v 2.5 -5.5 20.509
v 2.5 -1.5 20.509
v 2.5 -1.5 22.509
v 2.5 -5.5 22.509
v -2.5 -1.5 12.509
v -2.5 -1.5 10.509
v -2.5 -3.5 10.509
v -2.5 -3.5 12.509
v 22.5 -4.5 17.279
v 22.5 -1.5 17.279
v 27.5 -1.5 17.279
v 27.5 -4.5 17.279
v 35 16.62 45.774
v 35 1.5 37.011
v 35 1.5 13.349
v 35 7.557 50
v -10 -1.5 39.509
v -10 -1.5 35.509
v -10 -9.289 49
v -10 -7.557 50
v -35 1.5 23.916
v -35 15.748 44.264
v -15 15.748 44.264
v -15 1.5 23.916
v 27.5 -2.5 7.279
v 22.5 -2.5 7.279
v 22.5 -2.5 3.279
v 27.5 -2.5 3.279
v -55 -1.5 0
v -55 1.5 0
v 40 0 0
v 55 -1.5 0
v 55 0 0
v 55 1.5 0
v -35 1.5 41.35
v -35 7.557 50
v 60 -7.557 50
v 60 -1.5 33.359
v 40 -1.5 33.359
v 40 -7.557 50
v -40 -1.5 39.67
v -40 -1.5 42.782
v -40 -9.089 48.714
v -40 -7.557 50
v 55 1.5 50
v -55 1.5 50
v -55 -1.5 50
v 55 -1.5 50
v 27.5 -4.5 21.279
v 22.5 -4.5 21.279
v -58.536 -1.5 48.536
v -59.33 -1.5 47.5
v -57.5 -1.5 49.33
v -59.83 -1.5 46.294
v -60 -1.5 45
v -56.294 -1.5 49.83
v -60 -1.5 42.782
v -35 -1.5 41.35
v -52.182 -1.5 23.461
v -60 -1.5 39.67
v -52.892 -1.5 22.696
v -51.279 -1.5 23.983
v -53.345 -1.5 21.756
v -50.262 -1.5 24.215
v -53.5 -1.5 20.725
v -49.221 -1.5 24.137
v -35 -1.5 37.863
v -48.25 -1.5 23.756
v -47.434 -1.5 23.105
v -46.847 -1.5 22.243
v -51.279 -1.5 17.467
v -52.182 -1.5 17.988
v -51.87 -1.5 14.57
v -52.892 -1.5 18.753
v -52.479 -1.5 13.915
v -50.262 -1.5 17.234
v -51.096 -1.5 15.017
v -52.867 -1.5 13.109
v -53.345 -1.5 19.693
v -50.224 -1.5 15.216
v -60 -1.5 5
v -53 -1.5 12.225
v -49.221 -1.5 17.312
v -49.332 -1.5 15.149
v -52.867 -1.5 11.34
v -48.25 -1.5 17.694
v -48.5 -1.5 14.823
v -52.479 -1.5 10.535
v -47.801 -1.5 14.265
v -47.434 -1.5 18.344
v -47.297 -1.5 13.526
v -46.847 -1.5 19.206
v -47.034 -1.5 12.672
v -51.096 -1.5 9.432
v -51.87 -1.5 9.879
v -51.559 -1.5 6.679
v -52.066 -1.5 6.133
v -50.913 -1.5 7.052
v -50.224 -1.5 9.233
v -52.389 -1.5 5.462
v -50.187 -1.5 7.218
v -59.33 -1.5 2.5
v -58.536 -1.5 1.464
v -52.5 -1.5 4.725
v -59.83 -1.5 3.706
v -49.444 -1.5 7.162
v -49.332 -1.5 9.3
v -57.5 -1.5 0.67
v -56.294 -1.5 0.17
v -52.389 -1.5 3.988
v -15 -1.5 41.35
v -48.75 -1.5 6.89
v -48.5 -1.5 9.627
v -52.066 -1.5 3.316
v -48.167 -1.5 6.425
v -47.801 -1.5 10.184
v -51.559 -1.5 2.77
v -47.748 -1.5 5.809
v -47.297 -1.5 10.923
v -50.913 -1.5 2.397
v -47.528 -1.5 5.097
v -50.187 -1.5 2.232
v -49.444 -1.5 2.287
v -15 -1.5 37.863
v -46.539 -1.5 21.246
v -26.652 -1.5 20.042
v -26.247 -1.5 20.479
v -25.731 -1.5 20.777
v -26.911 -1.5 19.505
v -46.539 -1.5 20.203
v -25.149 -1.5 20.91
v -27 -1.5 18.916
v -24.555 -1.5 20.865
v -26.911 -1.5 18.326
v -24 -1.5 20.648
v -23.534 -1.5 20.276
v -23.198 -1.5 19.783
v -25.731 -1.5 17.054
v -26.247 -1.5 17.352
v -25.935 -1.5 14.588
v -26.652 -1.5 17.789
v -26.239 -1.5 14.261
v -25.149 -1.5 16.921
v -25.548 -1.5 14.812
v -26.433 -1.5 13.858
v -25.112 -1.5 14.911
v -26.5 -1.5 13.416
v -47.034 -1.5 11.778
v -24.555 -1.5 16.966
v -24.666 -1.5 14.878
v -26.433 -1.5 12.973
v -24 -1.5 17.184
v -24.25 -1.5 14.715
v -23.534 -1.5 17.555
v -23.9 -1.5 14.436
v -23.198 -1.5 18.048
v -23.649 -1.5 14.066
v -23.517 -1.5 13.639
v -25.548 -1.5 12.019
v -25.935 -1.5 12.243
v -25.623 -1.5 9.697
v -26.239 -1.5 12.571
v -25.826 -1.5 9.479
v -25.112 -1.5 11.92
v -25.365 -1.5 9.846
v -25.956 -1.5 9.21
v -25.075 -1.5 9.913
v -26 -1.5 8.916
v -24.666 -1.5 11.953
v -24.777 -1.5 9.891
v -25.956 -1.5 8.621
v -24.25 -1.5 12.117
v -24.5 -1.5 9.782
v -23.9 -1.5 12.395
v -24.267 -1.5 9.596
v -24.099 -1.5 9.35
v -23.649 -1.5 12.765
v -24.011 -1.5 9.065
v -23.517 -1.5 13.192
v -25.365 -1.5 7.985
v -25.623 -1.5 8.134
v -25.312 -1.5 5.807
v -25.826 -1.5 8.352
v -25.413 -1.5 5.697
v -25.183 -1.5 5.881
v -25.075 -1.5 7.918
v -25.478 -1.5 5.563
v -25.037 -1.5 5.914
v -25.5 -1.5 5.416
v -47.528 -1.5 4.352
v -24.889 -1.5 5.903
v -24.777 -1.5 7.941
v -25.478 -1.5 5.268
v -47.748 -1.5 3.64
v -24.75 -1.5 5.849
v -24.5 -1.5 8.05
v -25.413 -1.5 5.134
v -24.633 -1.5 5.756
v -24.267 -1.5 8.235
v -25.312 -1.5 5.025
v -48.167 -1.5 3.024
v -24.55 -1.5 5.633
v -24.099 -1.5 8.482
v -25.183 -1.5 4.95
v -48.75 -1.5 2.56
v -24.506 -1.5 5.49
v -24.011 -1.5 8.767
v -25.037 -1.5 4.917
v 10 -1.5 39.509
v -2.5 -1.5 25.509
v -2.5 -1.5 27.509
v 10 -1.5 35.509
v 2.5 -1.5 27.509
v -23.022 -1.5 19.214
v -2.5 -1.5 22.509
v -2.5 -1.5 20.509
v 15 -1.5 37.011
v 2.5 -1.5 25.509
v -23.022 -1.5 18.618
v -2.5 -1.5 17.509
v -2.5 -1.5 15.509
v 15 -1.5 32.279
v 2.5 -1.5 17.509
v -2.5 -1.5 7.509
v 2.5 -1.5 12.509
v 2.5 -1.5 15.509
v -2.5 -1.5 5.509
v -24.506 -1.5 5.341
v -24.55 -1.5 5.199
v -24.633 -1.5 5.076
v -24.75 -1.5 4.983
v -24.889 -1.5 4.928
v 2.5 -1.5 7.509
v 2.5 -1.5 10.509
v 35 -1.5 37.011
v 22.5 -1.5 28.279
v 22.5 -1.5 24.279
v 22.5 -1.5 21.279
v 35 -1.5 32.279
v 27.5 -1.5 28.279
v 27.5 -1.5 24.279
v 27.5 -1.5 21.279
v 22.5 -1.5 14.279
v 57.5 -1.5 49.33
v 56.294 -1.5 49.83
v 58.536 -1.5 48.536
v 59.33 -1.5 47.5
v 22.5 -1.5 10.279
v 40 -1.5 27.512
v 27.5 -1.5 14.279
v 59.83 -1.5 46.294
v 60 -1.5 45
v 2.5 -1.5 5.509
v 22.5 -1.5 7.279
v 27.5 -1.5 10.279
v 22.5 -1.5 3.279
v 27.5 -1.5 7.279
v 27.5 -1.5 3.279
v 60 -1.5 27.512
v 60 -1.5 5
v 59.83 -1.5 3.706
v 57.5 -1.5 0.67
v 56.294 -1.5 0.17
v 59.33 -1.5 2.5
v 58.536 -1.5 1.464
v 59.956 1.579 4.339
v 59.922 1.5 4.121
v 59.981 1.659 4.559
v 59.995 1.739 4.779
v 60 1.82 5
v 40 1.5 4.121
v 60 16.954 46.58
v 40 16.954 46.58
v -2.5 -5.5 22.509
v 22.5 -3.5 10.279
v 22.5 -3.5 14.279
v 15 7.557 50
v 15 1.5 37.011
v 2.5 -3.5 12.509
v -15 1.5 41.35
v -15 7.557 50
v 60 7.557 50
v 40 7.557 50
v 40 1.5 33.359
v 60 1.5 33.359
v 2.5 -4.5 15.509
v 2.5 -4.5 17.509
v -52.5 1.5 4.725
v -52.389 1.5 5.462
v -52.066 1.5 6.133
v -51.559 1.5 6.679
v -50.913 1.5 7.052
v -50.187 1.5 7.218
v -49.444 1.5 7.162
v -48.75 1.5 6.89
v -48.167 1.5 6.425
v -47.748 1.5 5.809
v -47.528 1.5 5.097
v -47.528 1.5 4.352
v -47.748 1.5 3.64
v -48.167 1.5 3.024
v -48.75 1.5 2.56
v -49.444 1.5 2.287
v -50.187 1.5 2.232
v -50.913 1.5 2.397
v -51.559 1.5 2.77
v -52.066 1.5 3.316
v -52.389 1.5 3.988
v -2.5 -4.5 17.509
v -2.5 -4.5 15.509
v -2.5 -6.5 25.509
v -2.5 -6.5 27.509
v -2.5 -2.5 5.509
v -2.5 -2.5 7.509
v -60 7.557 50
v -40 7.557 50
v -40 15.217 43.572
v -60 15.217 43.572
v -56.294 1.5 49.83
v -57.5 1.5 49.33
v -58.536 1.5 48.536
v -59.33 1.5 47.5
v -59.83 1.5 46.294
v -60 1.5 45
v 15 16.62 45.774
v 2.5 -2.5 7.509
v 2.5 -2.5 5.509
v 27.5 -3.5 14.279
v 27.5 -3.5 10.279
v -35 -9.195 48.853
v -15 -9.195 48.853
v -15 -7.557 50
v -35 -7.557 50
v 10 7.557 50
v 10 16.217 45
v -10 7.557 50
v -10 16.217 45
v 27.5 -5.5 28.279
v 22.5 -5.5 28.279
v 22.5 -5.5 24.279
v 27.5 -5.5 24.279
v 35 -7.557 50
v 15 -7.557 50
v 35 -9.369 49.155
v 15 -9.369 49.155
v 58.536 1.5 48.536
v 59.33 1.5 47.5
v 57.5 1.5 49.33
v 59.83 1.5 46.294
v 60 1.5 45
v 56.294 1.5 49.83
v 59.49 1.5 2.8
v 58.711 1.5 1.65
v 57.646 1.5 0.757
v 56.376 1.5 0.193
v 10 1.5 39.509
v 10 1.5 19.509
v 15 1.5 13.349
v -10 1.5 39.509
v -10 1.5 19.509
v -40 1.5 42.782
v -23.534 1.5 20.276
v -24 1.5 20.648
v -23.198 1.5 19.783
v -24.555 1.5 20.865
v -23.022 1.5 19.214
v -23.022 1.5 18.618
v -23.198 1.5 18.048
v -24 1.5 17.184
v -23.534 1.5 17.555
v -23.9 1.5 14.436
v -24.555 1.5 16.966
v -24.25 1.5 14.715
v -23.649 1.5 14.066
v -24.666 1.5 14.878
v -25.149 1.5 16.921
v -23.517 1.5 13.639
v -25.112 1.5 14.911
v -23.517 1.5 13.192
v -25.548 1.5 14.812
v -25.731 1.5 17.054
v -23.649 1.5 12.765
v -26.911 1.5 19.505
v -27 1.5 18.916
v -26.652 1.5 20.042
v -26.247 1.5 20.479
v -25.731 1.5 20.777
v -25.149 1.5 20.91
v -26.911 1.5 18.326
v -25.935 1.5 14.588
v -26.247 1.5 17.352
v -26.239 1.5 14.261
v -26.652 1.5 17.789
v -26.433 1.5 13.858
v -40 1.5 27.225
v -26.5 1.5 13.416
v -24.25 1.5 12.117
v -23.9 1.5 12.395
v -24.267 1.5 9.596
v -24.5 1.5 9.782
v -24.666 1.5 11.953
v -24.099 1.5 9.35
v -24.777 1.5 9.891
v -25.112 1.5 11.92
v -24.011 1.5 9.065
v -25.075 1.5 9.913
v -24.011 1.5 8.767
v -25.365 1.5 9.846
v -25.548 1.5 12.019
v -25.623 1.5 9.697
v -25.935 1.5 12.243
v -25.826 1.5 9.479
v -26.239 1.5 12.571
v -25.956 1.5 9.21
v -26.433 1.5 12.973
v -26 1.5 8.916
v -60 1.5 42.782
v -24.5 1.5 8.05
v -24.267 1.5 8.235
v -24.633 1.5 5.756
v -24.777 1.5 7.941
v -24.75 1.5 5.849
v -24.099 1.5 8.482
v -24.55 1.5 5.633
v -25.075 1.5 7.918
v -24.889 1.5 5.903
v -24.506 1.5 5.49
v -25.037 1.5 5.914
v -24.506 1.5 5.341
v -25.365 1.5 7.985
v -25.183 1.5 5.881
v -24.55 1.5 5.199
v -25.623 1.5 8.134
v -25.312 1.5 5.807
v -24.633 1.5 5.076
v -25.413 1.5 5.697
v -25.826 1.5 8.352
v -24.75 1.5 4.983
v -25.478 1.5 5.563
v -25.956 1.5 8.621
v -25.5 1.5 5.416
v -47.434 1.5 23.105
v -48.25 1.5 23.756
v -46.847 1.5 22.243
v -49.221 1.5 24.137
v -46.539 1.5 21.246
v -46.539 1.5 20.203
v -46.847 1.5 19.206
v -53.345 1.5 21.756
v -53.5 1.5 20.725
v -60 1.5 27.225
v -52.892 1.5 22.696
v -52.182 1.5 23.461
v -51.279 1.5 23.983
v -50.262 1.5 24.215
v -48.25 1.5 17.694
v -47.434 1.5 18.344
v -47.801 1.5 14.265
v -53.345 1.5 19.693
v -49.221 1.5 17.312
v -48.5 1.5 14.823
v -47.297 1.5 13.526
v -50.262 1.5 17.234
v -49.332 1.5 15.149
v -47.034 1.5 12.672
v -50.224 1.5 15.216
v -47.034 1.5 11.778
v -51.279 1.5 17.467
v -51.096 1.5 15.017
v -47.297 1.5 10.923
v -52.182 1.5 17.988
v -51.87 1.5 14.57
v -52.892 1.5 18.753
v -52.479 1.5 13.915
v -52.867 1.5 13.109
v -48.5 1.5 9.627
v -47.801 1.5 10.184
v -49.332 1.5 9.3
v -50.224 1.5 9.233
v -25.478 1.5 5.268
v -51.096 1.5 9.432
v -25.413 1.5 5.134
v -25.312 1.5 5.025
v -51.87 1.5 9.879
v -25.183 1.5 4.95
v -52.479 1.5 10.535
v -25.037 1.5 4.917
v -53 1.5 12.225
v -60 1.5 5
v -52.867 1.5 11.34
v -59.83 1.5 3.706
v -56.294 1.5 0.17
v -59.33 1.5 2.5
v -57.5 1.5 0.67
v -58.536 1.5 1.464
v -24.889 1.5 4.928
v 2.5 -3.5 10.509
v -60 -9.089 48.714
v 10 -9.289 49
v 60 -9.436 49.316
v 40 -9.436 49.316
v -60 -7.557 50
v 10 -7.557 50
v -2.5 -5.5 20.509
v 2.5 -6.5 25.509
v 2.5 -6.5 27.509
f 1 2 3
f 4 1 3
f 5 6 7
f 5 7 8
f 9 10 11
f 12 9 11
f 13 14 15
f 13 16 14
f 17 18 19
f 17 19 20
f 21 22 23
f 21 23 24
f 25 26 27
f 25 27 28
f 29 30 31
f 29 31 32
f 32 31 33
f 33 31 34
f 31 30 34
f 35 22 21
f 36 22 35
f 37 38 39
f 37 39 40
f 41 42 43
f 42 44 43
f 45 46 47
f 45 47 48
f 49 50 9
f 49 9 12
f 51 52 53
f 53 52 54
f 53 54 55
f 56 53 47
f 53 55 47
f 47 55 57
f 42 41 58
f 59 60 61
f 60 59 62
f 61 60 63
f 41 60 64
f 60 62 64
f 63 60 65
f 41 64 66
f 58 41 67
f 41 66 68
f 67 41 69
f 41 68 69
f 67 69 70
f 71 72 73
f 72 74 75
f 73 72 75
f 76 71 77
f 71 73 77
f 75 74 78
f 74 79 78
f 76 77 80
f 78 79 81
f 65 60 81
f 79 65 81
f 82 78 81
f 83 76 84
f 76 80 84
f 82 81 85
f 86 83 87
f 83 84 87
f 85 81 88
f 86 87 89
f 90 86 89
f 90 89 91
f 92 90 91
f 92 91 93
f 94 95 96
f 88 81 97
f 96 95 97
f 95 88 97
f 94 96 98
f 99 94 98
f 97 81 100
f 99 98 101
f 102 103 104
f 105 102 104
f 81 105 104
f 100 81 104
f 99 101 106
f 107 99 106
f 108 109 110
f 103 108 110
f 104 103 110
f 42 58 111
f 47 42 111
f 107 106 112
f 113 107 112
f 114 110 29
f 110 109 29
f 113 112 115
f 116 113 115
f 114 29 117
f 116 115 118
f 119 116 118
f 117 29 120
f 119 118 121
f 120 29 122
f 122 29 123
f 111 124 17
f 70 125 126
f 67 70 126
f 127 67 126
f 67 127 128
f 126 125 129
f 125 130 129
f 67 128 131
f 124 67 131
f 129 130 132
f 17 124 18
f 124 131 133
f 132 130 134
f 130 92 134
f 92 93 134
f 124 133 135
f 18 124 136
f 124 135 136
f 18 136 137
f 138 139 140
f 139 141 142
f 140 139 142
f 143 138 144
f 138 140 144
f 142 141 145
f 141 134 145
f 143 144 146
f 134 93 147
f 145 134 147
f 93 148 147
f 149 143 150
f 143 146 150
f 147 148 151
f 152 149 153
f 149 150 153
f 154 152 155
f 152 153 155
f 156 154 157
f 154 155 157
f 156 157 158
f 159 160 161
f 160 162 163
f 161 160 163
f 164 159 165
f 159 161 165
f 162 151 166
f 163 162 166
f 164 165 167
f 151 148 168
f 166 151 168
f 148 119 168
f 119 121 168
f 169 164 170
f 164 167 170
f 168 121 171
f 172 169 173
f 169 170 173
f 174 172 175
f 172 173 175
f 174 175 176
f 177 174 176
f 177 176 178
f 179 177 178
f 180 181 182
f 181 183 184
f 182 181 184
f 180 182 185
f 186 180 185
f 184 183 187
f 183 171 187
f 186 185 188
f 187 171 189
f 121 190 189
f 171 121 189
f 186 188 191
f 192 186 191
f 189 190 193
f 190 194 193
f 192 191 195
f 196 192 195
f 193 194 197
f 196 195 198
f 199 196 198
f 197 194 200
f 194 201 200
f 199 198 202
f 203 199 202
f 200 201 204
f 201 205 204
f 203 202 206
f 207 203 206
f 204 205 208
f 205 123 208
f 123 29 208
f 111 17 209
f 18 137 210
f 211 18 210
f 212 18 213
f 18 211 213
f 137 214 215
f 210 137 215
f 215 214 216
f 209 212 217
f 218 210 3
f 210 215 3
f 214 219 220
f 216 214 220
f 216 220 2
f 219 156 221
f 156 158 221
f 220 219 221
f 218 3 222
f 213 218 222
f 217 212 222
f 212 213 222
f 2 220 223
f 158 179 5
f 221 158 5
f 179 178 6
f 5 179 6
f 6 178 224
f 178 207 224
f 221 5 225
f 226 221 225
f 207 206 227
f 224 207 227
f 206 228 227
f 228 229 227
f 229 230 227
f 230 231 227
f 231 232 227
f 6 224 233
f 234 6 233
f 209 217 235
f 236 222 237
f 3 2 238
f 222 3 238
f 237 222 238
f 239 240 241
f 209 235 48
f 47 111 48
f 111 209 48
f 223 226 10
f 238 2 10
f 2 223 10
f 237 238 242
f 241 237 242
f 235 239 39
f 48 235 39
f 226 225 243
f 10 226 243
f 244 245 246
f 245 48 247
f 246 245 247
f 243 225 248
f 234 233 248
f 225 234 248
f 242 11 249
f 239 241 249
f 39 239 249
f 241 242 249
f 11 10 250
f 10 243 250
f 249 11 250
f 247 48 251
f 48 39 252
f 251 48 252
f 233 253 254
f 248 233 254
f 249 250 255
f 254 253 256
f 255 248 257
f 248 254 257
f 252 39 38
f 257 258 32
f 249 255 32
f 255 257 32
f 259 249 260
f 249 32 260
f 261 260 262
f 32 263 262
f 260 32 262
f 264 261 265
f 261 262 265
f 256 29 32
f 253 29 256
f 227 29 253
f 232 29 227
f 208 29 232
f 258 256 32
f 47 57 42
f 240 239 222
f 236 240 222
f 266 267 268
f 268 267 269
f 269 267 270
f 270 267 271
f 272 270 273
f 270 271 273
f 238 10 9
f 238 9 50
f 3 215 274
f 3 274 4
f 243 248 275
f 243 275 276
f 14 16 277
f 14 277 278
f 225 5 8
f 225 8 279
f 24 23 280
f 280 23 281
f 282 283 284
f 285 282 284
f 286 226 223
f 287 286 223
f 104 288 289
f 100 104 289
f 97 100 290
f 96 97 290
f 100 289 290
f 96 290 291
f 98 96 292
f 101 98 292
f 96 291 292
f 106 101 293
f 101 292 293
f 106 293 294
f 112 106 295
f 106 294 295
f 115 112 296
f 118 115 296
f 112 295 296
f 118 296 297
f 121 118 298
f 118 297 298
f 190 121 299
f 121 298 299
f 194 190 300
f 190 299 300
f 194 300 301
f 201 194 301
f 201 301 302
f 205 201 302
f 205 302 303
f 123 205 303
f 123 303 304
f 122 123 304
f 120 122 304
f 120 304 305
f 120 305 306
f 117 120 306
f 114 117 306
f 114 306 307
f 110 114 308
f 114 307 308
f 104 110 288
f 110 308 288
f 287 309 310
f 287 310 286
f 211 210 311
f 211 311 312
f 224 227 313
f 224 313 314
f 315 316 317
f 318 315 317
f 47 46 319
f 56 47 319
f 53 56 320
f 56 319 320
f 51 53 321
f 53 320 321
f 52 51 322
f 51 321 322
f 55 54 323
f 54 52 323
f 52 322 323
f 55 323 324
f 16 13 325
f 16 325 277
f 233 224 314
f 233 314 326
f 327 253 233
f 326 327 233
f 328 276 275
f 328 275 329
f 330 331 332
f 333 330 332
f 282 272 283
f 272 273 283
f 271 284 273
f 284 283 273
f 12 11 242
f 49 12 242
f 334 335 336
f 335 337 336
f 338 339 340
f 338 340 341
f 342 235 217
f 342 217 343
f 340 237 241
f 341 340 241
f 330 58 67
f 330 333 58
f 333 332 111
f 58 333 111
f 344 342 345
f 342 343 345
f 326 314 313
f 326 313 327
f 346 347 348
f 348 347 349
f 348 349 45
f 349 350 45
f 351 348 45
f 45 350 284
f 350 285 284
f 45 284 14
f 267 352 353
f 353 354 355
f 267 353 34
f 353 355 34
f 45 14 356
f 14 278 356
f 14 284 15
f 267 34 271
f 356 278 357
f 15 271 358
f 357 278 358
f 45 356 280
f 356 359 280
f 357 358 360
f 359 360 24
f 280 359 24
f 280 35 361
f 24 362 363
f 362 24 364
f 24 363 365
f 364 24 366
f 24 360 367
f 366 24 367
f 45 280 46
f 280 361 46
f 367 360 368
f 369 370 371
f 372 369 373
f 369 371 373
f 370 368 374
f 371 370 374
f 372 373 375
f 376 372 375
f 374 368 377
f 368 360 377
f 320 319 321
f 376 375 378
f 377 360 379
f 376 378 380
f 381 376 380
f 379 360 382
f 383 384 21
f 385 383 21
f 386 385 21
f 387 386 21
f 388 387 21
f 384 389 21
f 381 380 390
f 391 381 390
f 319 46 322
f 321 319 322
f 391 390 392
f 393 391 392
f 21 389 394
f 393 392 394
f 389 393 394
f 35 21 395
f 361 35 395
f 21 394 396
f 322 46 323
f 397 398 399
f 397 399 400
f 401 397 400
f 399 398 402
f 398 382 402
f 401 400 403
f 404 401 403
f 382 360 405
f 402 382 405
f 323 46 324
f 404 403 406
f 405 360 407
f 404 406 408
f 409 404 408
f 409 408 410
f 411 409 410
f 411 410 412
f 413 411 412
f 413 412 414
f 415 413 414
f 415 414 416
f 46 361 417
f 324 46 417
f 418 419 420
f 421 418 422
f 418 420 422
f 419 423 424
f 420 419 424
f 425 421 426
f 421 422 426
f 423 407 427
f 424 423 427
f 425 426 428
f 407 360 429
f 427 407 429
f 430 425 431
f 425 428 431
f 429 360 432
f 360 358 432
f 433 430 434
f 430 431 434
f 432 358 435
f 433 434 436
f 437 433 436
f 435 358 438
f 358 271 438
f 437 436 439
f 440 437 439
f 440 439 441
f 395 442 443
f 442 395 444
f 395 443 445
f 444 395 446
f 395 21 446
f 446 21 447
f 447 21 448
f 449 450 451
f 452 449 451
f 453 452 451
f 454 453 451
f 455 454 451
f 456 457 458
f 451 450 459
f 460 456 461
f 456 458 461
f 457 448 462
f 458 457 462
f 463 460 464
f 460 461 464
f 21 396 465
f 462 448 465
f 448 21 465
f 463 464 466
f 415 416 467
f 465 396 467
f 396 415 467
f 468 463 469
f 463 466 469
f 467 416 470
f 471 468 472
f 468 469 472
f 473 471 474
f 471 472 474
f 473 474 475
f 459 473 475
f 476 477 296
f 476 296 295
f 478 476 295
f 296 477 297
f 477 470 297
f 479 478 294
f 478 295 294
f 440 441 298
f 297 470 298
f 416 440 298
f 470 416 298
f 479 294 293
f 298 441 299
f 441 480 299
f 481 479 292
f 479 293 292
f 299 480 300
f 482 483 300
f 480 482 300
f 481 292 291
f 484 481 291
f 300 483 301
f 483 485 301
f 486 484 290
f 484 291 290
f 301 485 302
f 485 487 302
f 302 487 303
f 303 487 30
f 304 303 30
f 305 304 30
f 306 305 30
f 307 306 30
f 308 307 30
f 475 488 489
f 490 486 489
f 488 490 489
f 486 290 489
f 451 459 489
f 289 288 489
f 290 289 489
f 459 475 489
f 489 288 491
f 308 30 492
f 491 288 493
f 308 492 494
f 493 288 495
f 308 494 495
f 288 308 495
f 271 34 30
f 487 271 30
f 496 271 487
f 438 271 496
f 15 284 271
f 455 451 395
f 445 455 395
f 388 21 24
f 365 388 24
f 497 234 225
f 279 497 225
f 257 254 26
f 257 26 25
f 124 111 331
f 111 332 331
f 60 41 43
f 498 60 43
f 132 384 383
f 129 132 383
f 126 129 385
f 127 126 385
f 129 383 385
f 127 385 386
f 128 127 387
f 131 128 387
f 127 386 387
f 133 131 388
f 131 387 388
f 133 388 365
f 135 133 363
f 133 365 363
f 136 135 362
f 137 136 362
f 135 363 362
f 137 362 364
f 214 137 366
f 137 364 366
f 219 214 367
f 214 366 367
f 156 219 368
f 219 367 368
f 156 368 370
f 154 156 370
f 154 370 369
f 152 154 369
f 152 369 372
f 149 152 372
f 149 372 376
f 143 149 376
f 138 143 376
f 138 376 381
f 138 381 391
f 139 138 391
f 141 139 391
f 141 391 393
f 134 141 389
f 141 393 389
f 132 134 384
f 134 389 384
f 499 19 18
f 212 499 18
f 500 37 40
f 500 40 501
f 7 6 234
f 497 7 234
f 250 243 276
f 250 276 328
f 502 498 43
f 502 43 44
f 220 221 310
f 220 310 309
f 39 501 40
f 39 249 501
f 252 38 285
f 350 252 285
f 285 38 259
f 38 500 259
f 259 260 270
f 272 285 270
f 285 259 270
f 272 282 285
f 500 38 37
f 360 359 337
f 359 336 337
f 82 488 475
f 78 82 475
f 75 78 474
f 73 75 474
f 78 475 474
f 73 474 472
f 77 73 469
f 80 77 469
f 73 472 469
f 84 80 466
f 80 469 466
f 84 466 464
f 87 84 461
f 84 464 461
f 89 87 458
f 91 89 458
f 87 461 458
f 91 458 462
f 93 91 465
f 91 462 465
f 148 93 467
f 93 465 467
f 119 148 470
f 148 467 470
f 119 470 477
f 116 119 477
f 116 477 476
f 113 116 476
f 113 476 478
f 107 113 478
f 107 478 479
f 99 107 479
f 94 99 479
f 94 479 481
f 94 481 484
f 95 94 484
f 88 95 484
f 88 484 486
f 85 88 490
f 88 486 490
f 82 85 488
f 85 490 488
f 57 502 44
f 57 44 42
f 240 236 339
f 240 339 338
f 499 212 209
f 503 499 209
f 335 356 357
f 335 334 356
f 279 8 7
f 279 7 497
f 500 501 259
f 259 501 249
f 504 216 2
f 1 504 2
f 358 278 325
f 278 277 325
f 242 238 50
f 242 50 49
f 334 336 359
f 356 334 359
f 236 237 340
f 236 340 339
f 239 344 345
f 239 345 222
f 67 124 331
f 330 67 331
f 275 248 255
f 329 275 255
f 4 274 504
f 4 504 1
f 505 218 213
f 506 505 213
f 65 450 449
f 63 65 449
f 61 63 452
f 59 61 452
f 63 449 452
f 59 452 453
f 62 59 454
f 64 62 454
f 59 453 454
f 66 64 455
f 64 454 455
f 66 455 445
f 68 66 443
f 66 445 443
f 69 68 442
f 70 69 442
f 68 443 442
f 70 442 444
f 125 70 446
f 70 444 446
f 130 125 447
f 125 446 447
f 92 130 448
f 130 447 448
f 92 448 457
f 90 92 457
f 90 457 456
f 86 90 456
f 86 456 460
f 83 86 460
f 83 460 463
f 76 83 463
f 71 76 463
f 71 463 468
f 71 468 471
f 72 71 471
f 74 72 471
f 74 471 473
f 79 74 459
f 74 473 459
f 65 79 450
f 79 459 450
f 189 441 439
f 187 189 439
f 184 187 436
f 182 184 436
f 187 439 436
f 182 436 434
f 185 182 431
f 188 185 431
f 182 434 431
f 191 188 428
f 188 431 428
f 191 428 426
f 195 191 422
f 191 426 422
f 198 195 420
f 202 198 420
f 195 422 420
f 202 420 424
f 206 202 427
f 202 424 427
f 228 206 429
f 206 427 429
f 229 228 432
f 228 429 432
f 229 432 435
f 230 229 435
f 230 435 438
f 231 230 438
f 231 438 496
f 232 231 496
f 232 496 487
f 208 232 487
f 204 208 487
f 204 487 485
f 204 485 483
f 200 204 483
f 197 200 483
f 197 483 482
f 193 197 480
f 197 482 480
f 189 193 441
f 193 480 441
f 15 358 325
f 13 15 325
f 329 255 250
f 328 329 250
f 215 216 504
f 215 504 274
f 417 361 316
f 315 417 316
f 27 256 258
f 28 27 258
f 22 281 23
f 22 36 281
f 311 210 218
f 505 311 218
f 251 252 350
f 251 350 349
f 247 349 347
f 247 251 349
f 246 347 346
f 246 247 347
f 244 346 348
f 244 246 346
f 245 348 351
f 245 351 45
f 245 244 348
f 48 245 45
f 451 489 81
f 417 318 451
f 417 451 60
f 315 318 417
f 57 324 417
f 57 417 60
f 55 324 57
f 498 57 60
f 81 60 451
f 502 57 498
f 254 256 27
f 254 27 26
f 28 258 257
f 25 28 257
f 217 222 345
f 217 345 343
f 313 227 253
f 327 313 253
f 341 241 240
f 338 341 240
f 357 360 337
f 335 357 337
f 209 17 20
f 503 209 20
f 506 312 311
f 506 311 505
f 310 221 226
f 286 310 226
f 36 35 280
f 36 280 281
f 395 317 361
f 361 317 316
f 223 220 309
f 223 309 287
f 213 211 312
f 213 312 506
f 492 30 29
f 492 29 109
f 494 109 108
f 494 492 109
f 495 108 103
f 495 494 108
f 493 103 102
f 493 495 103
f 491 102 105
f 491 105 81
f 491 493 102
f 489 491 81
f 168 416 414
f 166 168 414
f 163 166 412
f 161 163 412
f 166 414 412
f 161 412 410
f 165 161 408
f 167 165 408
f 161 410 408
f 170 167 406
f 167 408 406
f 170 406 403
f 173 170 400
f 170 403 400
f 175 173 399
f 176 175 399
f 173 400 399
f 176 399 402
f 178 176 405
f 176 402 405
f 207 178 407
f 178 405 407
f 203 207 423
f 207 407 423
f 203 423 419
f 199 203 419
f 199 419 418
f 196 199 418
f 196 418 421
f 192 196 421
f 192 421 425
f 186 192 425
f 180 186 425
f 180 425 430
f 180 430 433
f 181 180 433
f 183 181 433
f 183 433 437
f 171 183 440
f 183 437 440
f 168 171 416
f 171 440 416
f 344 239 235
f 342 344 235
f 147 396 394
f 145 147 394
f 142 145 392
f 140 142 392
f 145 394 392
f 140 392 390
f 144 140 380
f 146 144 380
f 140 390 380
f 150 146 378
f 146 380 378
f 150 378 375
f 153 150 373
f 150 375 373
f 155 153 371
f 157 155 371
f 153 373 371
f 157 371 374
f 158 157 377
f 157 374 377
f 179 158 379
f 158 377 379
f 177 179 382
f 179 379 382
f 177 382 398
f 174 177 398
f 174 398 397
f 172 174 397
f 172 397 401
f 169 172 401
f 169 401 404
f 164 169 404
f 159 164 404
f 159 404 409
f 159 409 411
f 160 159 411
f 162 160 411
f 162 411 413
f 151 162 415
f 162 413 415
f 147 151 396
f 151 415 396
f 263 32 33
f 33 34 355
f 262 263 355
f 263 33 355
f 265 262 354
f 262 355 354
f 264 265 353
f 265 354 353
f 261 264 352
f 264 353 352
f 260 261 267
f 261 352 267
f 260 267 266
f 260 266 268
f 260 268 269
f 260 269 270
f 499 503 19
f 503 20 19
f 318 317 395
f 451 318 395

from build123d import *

# Parameters (mm, degrees)
F0_W          = 58.5
F0_H          = 1.5
F0_H_2        = 3
F1_DEPTH      = 50
F9_DEPTH      = 10
F10_T1_DEPTH  = 28
F10_T3_DEPTH  = 14
F10_T5_DEPTH  = 14
F10_T10_DEPTH = 28
F10_T16_DEPTH = 28
F11_R         = 0.5
F11_R_2       = 1
F11_R_3       = 1.5
F11_R_4       = 2
F11_R_5       = 2.5
F11_R_6       = 3
F11_R_7       = 3.5
F12_DEPTH     = 3
F13_W         = 5
F13_H         = 2
F14_W         = 5
F14_H         = 4
F15_DEPTH     = 1
F16_DEPTH     = 2
F17_DEPTH     = 3
F18_DEPTH     = 4
F19_DEPTH     = 5


# Not quite as in the source:
# - a fillet or chamfer that OpenCascade refuses, or shapes differently, is made with other operations: its cross-section is extruded or revolved along the edge and cut away or added


with BuildPart() as f1:
    # F0 (on Top) → F1 (new body)
    with BuildSketch(Plane.XY):
        with Locations((-30.75, -0.75)):
            Rectangle(F0_W, F0_H)
        with Locations((-30.75, 0.75)):
            Rectangle(F0_W, F0_H)
        Polygon((1.5, 1.5), (-1.5, 1.5), (-1.5, 0), (-1.5, -1.5), (1.5, -1.5), align=None)
        with Locations((30.75, 0)):
            Rectangle(F0_W, F0_H_2)
    extrude(amount=F1_DEPTH)

    # F4 (on offset) + F5 (on offset) + F6 (on Right) + F7 (on face) + F8 (on face) → F9 (join, symmetric)
    with BuildSketch(Plane.YZ.offset(50)):
        Polygon((0, 23.3904352013), (0, 0), (16.9536601964, 46.5797985667), (7.5567339886, 50), (0, 29.2380440016), align=None)
        Polygon((-9.4361192301, 49.3159597133), (0, 23.3904352013), (0, 29.2380440016), (-7.5567339886, 50), align=None)
    with BuildSketch(Plane.YZ.offset(25)):
        Polygon((0, 29.0621284988), (0, 10.1325158336), (16.6198118589, 45.7738173826), (7.5567339886, 50), (0, 33.7945316651), align=None)
        Polygon((-9.3693495626, 49.1547634765), (0, 29.0621284988), (0, 33.7945316651), (-7.5567339886, 50), align=None)
    with BuildSketch(Plane.YZ):
        Polygon((0, 32.9113527925), (0, 16.9113527925), (16.2169880264, 45), (7.5567339886, 50), (0, 36.9113527925), align=None)
        Polygon((-9.2887847961, 49), (0, 32.9113527925), (0, 36.9113527925), (-7.5567339886, 50), align=None)
    with BuildSketch(Plane(origin=(-25, 0, 0), x_dir=(0, -1, 0), z_dir=(-1, 0, 0))):
        Polygon((-15.7482544314, 44.2642356365), (0, 21.7733974606), (0, 35.7209718255), (0, 39.2078654168), (-7.5567339886, 50), align=None)
        Polygon((0, 39.2078654168), (0, 35.7209718255), (9.1950380771, 48.8528471273), (7.5567339886, 50), align=None)
    with BuildSketch(Plane(origin=(-50, 0, 0), x_dir=(0, -1, 0), z_dir=(-1, 0, 0))):
        Polygon((-15.2171784197, 43.5721239031), (0, 25.4369968523), (0, 37.8827874671), (0, 40.9942351209), (-7.5567339886, 50), align=None)
        Polygon((0, 40.9942351209), (0, 37.8827874671), (9.0888228748, 48.7144247806), (7.5567339886, 50), align=None)
    extrude(amount=F9_DEPTH, both=True, dir=(1, 0, 0))

    # F10: fillet of radius 5 on 5 edges, made by hand

    # F10_s2 → F10_t1 (cut)
    with BuildSketch(Plane.XZ.offset(-14)):
        with BuildLine():
            ThreePointArc((-55, 0), (-58.5355339059, 1.4644660941), (-60, 5))
            Line((-60, 5), (-60, 0))
            Line((-60, 0), (-55, 0))
        make_face()
    extrude(amount=F10_T1_DEPTH, mode=Mode.SUBTRACT)

    # F10_s4 → F10_t3 (cut)
    with BuildSketch(Plane.XZ):
        with BuildLine():
            ThreePointArc((55, 0), (58.5355339059, 1.4644660941), (60, 5))
            Line((60, 5), (60, 0))
            Line((60, 0), (55, 0))
        make_face()
    extrude(amount=F10_T3_DEPTH, mode=Mode.SUBTRACT)

    # F10_s6 → F10_t5 (cut)
    with BuildSketch(Plane.XZ.offset(-14)):
        with BuildLine():
            ThreePointArc((55, 0), (58.5355339059, 1.4644660941), (60, 5))
            Line((60, 5), (60, 0))
            Line((60, 0), (55, 0))
        make_face()
    extrude(amount=F10_T5_DEPTH, mode=Mode.SUBTRACT)


with BuildPart() as f10_tool8:
    # F10_s9 → F10_t10 (new body)
    with BuildSketch(Plane.XZ.offset(14)):
        with BuildLine():
            ThreePointArc((60, 45), (58.5355339059, 48.5355339059), (55, 50))
            Line((55, 50), (60, 50))
            Line((60, 50), (60, 45))
        make_face()
    extrude(amount=-F10_T10_DEPTH)

    split(bisect_by=Plane(origin=(0, 9.3969262079, 3.4202014333), x_dir=(1, 0, 0), z_dir=(0, 0.9396926208, 0.3420201433)), keep=Keep.TOP)

    split(bisect_by=Plane(origin=(0, -9.3969262079, 3.4202014333), x_dir=(1, 0, 0), z_dir=(0, -0.9396926208, 0.3420201433)), keep=Keep.TOP)


with BuildPart() as f1_1:
    add(f1.part)

    # F10_t7: cut F10_tool8
    add(f10_tool8.part, mode=Mode.SUBTRACT)


with BuildPart() as f10_tool14:
    # F10_s15 → F10_t16 (new body)
    with BuildSketch(Plane.XZ.offset(-14)):
        with BuildLine():
            ThreePointArc((-55, 50), (-58.5355339059, 48.5355339059), (-60, 45))
            Line((-60, 45), (-60, 50))
            Line((-60, 50), (-55, 50))
        make_face()
    extrude(amount=F10_T16_DEPTH)

    split(bisect_by=Plane(origin=(0, 20.1857202879, 16.9378304486), x_dir=(1, 0, 0), z_dir=(0, 0.7660444431, 0.6427876097)), keep=Keep.TOP)

    split(bisect_by=Plane(origin=(0, -20.1857202879, 16.9378304486), x_dir=(1, 0, 0), z_dir=(0, -0.7660444431, 0.6427876097)), keep=Keep.TOP)


with BuildPart() as f1_2:
    add(f1_1.part)

    # F10_t13: cut F10_tool14
    add(f10_tool14.part, mode=Mode.SUBTRACT)

    # F11 (on face) → F12 (cut, through all)
    with BuildSketch(Plane(origin=(0, 1.5, 0), x_dir=(-1, 0, 0), z_dir=(0, 1, 0))):
        with Locations((25, 5.4156194707)):
            Circle(F11_R)
        with Locations((25, 8.9156194707)):
            Circle(F11_R_2)
        with Locations((25, 13.4156194707)):
            Circle(F11_R_3)
        with Locations((25, 18.9156194707)):
            Circle(F11_R_4)
        with Locations((50, 4.7246272412)):
            Circle(F11_R_5)
        with Locations((50, 12.2246272412)):
            Circle(F11_R_6)
        with Locations((50, 20.7246272412)):
            Circle(F11_R_7)
    extrude(amount=-F12_DEPTH, mode=Mode.SUBTRACT)

    # F13 (on face) + F14 (on face) → F15 (join)
    with BuildSketch(Plane.XZ.offset(1.5)):
        with Locations((0, 6.5094290039)):
            Rectangle(F13_W, F13_H)
    with BuildSketch(Plane.XZ.offset(1.5)):
        with Locations((25, 5.2788888796)):
            Rectangle(F14_W, F14_H)
    extrude(amount=F15_DEPTH)

    # F13 (on face) + F14 (on face) → F16 (join)
    with BuildSketch(Plane.XZ.offset(1.5)):
        with Locations((0, 11.5094290039)):
            Rectangle(F13_W, F13_H)
    with BuildSketch(Plane.XZ.offset(1.5)):
        with Locations((25, 12.2788888796)):
            Rectangle(F14_W, F14_H)
    extrude(amount=F16_DEPTH)

    # F13 (on face) + F14 (on face) → F17 (join)
    with BuildSketch(Plane.XZ.offset(1.5)):
        with Locations((0, 16.5094290039)):
            Rectangle(F13_W, F13_H)
    with BuildSketch(Plane.XZ.offset(1.5)):
        with Locations((25, 19.2788888796)):
            Rectangle(F14_W, F14_H)
    extrude(amount=F17_DEPTH)

    # F13 (on face) + F14 (on face) → F18 (join)
    with BuildSketch(Plane.XZ.offset(1.5)):
        with Locations((0, 21.5094290039)):
            Rectangle(F13_W, F13_H)
    with BuildSketch(Plane.XZ.offset(1.5)):
        with Locations((25, 26.2788888796)):
            Rectangle(F14_W, F14_H)
    extrude(amount=F18_DEPTH)

    # F13 (on face) → F19 (join)
    with BuildSketch(Plane.XZ.offset(1.5)):
        with Locations((0, 26.5094290039)):
            Rectangle(F13_W, F13_H)
    extrude(amount=F19_DEPTH)


solid = f1_2.part
